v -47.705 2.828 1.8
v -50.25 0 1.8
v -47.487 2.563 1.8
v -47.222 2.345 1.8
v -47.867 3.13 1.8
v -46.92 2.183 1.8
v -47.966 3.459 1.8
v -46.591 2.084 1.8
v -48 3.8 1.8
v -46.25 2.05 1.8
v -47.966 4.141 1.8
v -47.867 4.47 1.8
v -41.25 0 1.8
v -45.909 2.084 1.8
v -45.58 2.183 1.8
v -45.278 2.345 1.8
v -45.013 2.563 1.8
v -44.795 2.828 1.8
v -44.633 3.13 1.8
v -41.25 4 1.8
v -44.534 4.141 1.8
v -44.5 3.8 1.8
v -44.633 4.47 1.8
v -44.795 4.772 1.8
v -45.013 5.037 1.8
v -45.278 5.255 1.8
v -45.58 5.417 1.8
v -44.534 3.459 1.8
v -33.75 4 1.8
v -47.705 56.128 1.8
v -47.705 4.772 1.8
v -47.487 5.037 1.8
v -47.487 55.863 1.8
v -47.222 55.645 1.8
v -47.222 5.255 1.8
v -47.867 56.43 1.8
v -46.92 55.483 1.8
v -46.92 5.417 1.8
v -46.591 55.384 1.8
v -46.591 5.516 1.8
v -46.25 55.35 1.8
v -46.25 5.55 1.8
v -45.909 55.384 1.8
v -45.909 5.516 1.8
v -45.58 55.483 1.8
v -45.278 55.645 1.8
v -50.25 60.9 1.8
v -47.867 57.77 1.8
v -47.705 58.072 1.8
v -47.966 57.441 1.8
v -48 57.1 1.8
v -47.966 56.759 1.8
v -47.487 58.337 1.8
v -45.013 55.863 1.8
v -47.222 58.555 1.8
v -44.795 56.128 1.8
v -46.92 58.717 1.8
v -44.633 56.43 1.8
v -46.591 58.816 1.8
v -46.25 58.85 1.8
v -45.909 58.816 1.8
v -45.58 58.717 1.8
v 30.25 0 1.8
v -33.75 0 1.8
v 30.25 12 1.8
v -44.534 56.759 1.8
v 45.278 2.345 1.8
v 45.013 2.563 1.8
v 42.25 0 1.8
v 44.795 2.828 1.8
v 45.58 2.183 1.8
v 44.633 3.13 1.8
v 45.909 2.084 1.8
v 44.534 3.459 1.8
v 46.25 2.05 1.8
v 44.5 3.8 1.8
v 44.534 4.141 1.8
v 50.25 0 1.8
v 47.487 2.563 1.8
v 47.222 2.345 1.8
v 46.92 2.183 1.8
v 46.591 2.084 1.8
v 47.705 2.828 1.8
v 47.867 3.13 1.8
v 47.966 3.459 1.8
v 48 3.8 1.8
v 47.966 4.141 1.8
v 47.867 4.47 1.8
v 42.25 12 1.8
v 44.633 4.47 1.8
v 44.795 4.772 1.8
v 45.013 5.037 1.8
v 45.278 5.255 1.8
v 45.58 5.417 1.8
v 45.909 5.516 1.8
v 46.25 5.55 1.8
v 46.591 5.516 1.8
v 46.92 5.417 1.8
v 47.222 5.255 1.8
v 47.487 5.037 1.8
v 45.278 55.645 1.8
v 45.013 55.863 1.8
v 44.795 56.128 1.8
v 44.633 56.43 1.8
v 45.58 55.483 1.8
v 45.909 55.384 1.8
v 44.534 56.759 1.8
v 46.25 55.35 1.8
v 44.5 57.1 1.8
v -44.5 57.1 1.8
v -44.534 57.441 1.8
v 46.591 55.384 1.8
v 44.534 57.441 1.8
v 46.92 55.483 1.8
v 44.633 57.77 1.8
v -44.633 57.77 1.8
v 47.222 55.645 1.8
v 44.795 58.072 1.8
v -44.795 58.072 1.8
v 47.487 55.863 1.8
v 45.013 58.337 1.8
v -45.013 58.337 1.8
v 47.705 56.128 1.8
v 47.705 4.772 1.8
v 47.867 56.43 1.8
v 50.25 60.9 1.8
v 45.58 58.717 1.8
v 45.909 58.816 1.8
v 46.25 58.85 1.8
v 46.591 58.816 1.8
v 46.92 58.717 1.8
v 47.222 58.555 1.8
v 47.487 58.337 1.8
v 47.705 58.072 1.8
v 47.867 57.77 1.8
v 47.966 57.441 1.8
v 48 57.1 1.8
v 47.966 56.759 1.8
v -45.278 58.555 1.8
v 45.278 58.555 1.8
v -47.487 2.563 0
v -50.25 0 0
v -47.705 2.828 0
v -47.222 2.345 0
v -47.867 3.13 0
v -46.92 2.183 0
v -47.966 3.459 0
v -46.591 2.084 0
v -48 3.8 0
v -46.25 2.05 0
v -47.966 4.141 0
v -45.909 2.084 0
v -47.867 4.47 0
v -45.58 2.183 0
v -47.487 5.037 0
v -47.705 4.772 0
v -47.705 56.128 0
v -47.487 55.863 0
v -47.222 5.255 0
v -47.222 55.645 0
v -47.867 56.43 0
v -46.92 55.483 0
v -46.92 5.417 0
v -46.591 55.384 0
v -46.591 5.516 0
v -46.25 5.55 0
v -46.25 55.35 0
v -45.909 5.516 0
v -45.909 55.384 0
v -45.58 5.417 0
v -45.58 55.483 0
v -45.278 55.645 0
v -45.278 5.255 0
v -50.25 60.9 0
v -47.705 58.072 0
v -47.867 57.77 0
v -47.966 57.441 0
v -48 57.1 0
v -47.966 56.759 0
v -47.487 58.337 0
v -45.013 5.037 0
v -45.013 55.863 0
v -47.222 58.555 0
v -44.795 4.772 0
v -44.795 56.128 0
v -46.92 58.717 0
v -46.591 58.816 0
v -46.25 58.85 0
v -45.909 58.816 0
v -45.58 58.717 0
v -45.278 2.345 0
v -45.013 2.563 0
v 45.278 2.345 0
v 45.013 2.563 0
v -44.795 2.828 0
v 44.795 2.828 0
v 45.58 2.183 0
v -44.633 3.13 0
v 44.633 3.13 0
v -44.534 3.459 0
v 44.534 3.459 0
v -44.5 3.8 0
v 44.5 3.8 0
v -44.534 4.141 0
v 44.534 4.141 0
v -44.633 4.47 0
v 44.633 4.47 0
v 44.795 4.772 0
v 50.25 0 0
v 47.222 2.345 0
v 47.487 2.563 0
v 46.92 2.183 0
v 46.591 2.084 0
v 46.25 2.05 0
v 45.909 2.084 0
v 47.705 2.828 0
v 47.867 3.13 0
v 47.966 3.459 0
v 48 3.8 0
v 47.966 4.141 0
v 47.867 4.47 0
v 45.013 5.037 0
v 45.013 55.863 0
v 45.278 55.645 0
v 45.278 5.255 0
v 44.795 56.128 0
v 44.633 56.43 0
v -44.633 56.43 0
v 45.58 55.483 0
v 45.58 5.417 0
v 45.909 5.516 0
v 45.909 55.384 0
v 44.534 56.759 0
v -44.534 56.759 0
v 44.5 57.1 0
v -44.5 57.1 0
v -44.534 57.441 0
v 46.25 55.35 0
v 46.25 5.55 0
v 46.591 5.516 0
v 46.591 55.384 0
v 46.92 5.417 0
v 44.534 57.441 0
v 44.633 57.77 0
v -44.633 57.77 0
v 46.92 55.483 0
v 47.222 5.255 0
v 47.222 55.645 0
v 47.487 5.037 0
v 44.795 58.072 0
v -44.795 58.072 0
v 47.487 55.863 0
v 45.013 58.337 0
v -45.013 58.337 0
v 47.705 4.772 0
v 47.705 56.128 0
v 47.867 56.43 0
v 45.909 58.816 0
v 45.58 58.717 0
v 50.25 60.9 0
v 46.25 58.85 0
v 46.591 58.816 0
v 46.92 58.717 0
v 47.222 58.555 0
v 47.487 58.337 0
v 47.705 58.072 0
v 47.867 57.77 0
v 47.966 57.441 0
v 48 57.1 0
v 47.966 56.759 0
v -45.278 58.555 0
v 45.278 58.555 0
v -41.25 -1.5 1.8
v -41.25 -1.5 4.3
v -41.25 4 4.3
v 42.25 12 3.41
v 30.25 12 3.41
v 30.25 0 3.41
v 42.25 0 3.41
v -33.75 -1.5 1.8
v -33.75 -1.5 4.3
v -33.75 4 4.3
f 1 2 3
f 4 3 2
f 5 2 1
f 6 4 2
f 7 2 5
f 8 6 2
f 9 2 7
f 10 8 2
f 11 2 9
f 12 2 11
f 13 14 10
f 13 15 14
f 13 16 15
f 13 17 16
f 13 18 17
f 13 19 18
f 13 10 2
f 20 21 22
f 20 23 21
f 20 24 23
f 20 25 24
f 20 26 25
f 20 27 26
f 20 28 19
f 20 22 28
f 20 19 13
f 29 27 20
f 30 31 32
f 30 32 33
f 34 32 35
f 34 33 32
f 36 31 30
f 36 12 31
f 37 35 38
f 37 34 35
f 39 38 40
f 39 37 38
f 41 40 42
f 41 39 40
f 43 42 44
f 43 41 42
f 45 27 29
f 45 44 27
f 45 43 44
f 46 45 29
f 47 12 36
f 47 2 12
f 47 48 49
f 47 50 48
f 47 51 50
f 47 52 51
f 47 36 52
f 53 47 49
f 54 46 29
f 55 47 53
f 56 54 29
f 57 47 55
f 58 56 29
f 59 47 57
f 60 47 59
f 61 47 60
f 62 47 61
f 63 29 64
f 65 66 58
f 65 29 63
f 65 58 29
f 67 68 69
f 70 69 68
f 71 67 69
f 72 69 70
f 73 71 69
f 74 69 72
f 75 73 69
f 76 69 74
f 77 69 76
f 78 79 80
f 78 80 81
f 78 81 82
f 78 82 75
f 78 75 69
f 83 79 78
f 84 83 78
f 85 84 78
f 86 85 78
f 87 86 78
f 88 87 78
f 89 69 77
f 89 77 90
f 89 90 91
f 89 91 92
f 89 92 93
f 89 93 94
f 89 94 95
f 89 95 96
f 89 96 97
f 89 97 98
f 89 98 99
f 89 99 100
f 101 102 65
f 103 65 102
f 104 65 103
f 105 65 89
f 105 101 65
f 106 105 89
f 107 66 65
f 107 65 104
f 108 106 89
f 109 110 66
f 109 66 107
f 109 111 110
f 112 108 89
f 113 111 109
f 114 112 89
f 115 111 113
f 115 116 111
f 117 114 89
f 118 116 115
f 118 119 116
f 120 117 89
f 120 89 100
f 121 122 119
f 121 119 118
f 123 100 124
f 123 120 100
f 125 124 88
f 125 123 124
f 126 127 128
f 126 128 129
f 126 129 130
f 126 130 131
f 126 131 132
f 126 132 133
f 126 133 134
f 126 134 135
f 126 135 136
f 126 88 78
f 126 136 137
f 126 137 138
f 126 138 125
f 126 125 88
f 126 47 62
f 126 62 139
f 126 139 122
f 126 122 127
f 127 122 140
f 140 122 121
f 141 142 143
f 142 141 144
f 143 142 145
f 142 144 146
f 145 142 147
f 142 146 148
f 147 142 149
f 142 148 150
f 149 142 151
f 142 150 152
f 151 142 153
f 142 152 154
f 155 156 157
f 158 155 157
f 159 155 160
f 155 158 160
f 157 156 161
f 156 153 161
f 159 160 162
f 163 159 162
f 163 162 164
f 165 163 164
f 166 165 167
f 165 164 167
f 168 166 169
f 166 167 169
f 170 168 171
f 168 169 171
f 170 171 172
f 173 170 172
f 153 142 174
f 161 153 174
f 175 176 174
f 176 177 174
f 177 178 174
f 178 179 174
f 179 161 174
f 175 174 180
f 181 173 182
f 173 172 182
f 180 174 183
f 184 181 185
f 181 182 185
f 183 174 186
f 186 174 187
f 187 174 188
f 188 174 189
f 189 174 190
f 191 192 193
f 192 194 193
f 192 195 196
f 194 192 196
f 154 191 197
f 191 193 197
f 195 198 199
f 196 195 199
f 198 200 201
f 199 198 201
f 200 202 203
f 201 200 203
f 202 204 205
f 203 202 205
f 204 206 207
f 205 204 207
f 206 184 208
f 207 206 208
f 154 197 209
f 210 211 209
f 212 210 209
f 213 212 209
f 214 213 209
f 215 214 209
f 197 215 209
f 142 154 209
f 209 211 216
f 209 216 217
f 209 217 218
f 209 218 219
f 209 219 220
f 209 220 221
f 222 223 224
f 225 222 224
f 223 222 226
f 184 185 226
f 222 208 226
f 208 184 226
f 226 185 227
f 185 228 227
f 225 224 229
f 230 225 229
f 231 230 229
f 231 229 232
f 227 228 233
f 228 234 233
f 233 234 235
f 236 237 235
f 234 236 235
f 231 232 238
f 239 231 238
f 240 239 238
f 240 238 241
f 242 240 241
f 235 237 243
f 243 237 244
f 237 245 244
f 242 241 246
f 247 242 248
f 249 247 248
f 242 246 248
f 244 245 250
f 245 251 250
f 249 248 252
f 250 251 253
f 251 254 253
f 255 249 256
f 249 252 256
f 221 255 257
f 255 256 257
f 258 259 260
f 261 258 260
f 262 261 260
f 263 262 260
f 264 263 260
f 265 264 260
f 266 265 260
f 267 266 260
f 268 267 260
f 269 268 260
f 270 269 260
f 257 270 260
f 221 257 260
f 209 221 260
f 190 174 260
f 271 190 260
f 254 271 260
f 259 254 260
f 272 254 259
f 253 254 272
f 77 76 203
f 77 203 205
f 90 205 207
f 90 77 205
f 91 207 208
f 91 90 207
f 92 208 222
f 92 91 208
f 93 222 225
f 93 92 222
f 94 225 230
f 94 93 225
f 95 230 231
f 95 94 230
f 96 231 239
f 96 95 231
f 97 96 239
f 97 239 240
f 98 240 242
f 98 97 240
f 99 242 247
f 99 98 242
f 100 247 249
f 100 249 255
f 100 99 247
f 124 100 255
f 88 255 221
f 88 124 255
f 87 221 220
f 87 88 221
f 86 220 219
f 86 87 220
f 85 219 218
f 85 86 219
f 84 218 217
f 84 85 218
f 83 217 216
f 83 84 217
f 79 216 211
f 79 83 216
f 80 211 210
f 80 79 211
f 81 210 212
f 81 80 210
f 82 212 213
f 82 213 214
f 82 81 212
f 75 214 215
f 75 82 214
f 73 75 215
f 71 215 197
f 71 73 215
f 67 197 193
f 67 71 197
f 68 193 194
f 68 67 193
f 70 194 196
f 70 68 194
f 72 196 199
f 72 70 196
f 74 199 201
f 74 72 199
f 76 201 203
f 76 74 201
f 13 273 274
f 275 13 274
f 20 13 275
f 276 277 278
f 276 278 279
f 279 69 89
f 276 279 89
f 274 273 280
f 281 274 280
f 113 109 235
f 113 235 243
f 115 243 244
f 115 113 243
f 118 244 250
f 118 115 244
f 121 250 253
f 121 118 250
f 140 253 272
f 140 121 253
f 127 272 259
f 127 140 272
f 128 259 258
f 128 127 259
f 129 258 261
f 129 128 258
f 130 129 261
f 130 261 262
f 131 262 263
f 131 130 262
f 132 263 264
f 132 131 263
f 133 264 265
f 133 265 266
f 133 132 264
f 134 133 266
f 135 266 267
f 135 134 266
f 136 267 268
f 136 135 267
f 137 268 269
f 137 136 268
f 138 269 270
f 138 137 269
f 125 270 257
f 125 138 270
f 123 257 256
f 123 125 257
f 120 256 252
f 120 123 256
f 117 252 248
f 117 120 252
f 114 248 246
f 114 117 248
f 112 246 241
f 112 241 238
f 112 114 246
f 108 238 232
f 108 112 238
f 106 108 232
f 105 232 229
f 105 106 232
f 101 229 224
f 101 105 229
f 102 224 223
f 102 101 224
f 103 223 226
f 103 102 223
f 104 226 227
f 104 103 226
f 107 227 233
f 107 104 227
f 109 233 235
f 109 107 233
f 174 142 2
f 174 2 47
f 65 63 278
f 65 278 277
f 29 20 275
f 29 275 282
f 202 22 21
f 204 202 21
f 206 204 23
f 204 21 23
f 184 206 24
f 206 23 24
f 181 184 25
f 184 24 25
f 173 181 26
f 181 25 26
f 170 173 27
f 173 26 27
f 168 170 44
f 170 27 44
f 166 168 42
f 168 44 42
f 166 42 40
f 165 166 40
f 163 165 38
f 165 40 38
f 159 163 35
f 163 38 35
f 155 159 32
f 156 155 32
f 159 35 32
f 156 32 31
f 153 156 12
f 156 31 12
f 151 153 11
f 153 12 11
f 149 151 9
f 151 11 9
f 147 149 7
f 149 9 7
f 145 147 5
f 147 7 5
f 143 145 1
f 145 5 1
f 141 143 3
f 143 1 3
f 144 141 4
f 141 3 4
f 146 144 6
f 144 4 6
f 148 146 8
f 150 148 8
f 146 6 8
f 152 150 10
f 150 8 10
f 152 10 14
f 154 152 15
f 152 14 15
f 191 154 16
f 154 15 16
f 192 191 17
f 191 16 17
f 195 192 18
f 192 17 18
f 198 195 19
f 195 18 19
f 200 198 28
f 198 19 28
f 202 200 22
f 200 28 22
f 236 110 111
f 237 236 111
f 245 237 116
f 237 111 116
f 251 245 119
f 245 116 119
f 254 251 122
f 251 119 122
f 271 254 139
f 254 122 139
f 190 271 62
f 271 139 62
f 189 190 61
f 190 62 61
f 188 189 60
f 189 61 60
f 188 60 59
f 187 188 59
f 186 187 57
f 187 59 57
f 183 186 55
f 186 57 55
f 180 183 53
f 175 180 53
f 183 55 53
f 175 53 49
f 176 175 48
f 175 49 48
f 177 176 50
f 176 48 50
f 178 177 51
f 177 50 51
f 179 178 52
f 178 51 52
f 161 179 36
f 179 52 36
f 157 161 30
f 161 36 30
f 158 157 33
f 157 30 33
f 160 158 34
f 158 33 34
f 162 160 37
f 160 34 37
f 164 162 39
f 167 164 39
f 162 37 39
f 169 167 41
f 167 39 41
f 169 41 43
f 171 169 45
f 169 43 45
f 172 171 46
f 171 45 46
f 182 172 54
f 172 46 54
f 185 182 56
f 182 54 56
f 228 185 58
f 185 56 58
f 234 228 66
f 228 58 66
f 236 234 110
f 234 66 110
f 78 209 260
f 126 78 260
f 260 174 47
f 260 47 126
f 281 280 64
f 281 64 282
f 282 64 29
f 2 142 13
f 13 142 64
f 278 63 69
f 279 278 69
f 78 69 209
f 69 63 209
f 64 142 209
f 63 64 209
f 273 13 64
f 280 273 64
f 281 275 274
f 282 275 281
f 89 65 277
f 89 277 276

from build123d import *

# Parameters (mm, degrees)
SKETCH1_W           = 100.5
SKETCH1_H           = 60.9
BOSS_EXTRUDE1_DEPTH = 1.8
SKETCH2_R           = 1.75
CUT_EXTRUDE1_DEPTH  = 1.8
SKETCH3_W           = 12
SKETCH3_H           = 12
BOSS_EXTRUDE2_DEPTH = 1.61
SKETCH4_W           = 7.5
SKETCH4_H           = 5.5
BOSS_EXTRUDE3_DEPTH = 2.5


with BuildPart() as part:
    # Sketch1 → Boss-Extrude1 (new body)
    with BuildSketch(Plane.XY):
        with Locations((0, 30.45)):
            Rectangle(SKETCH1_W, SKETCH1_H)
    extrude(amount=BOSS_EXTRUDE1_DEPTH)

    # Sketch2 → Cut-Extrude1 (cut)
    with BuildSketch(Plane.XY.offset(1.8)):
        with Locations((-46.25, 3.8)):
            Circle(SKETCH2_R)
        with Locations((-46.25, 57.1)):
            Circle(SKETCH2_R)
    cut_extrude1 = extrude(amount=-CUT_EXTRUDE1_DEPTH, mode=Mode.SUBTRACT)

    # Mirror1: Cut-Extrude1 across plane
    add(cut_extrude1.mirror(Plane(origin=(0, 0, 0), x_dir=(0, 0, 1), z_dir=(1, 0, 0))), mode=Mode.SUBTRACT)

    # Sketch3 → Boss-Extrude2 (add)
    with BuildSketch(Plane.XY.offset(1.8)):
        with Locations((36.25, 6)):
            Rectangle(SKETCH3_W, SKETCH3_H)
    extrude(amount=BOSS_EXTRUDE2_DEPTH)

    # Sketch4 → Boss-Extrude3 (add)
    with BuildSketch(Plane.XY.offset(1.8)):
        with Locations((-37.5, 1.25)):
            Rectangle(SKETCH4_W, SKETCH4_H)
    extrude(amount=BOSS_EXTRUDE3_DEPTH)


solid = part.part
